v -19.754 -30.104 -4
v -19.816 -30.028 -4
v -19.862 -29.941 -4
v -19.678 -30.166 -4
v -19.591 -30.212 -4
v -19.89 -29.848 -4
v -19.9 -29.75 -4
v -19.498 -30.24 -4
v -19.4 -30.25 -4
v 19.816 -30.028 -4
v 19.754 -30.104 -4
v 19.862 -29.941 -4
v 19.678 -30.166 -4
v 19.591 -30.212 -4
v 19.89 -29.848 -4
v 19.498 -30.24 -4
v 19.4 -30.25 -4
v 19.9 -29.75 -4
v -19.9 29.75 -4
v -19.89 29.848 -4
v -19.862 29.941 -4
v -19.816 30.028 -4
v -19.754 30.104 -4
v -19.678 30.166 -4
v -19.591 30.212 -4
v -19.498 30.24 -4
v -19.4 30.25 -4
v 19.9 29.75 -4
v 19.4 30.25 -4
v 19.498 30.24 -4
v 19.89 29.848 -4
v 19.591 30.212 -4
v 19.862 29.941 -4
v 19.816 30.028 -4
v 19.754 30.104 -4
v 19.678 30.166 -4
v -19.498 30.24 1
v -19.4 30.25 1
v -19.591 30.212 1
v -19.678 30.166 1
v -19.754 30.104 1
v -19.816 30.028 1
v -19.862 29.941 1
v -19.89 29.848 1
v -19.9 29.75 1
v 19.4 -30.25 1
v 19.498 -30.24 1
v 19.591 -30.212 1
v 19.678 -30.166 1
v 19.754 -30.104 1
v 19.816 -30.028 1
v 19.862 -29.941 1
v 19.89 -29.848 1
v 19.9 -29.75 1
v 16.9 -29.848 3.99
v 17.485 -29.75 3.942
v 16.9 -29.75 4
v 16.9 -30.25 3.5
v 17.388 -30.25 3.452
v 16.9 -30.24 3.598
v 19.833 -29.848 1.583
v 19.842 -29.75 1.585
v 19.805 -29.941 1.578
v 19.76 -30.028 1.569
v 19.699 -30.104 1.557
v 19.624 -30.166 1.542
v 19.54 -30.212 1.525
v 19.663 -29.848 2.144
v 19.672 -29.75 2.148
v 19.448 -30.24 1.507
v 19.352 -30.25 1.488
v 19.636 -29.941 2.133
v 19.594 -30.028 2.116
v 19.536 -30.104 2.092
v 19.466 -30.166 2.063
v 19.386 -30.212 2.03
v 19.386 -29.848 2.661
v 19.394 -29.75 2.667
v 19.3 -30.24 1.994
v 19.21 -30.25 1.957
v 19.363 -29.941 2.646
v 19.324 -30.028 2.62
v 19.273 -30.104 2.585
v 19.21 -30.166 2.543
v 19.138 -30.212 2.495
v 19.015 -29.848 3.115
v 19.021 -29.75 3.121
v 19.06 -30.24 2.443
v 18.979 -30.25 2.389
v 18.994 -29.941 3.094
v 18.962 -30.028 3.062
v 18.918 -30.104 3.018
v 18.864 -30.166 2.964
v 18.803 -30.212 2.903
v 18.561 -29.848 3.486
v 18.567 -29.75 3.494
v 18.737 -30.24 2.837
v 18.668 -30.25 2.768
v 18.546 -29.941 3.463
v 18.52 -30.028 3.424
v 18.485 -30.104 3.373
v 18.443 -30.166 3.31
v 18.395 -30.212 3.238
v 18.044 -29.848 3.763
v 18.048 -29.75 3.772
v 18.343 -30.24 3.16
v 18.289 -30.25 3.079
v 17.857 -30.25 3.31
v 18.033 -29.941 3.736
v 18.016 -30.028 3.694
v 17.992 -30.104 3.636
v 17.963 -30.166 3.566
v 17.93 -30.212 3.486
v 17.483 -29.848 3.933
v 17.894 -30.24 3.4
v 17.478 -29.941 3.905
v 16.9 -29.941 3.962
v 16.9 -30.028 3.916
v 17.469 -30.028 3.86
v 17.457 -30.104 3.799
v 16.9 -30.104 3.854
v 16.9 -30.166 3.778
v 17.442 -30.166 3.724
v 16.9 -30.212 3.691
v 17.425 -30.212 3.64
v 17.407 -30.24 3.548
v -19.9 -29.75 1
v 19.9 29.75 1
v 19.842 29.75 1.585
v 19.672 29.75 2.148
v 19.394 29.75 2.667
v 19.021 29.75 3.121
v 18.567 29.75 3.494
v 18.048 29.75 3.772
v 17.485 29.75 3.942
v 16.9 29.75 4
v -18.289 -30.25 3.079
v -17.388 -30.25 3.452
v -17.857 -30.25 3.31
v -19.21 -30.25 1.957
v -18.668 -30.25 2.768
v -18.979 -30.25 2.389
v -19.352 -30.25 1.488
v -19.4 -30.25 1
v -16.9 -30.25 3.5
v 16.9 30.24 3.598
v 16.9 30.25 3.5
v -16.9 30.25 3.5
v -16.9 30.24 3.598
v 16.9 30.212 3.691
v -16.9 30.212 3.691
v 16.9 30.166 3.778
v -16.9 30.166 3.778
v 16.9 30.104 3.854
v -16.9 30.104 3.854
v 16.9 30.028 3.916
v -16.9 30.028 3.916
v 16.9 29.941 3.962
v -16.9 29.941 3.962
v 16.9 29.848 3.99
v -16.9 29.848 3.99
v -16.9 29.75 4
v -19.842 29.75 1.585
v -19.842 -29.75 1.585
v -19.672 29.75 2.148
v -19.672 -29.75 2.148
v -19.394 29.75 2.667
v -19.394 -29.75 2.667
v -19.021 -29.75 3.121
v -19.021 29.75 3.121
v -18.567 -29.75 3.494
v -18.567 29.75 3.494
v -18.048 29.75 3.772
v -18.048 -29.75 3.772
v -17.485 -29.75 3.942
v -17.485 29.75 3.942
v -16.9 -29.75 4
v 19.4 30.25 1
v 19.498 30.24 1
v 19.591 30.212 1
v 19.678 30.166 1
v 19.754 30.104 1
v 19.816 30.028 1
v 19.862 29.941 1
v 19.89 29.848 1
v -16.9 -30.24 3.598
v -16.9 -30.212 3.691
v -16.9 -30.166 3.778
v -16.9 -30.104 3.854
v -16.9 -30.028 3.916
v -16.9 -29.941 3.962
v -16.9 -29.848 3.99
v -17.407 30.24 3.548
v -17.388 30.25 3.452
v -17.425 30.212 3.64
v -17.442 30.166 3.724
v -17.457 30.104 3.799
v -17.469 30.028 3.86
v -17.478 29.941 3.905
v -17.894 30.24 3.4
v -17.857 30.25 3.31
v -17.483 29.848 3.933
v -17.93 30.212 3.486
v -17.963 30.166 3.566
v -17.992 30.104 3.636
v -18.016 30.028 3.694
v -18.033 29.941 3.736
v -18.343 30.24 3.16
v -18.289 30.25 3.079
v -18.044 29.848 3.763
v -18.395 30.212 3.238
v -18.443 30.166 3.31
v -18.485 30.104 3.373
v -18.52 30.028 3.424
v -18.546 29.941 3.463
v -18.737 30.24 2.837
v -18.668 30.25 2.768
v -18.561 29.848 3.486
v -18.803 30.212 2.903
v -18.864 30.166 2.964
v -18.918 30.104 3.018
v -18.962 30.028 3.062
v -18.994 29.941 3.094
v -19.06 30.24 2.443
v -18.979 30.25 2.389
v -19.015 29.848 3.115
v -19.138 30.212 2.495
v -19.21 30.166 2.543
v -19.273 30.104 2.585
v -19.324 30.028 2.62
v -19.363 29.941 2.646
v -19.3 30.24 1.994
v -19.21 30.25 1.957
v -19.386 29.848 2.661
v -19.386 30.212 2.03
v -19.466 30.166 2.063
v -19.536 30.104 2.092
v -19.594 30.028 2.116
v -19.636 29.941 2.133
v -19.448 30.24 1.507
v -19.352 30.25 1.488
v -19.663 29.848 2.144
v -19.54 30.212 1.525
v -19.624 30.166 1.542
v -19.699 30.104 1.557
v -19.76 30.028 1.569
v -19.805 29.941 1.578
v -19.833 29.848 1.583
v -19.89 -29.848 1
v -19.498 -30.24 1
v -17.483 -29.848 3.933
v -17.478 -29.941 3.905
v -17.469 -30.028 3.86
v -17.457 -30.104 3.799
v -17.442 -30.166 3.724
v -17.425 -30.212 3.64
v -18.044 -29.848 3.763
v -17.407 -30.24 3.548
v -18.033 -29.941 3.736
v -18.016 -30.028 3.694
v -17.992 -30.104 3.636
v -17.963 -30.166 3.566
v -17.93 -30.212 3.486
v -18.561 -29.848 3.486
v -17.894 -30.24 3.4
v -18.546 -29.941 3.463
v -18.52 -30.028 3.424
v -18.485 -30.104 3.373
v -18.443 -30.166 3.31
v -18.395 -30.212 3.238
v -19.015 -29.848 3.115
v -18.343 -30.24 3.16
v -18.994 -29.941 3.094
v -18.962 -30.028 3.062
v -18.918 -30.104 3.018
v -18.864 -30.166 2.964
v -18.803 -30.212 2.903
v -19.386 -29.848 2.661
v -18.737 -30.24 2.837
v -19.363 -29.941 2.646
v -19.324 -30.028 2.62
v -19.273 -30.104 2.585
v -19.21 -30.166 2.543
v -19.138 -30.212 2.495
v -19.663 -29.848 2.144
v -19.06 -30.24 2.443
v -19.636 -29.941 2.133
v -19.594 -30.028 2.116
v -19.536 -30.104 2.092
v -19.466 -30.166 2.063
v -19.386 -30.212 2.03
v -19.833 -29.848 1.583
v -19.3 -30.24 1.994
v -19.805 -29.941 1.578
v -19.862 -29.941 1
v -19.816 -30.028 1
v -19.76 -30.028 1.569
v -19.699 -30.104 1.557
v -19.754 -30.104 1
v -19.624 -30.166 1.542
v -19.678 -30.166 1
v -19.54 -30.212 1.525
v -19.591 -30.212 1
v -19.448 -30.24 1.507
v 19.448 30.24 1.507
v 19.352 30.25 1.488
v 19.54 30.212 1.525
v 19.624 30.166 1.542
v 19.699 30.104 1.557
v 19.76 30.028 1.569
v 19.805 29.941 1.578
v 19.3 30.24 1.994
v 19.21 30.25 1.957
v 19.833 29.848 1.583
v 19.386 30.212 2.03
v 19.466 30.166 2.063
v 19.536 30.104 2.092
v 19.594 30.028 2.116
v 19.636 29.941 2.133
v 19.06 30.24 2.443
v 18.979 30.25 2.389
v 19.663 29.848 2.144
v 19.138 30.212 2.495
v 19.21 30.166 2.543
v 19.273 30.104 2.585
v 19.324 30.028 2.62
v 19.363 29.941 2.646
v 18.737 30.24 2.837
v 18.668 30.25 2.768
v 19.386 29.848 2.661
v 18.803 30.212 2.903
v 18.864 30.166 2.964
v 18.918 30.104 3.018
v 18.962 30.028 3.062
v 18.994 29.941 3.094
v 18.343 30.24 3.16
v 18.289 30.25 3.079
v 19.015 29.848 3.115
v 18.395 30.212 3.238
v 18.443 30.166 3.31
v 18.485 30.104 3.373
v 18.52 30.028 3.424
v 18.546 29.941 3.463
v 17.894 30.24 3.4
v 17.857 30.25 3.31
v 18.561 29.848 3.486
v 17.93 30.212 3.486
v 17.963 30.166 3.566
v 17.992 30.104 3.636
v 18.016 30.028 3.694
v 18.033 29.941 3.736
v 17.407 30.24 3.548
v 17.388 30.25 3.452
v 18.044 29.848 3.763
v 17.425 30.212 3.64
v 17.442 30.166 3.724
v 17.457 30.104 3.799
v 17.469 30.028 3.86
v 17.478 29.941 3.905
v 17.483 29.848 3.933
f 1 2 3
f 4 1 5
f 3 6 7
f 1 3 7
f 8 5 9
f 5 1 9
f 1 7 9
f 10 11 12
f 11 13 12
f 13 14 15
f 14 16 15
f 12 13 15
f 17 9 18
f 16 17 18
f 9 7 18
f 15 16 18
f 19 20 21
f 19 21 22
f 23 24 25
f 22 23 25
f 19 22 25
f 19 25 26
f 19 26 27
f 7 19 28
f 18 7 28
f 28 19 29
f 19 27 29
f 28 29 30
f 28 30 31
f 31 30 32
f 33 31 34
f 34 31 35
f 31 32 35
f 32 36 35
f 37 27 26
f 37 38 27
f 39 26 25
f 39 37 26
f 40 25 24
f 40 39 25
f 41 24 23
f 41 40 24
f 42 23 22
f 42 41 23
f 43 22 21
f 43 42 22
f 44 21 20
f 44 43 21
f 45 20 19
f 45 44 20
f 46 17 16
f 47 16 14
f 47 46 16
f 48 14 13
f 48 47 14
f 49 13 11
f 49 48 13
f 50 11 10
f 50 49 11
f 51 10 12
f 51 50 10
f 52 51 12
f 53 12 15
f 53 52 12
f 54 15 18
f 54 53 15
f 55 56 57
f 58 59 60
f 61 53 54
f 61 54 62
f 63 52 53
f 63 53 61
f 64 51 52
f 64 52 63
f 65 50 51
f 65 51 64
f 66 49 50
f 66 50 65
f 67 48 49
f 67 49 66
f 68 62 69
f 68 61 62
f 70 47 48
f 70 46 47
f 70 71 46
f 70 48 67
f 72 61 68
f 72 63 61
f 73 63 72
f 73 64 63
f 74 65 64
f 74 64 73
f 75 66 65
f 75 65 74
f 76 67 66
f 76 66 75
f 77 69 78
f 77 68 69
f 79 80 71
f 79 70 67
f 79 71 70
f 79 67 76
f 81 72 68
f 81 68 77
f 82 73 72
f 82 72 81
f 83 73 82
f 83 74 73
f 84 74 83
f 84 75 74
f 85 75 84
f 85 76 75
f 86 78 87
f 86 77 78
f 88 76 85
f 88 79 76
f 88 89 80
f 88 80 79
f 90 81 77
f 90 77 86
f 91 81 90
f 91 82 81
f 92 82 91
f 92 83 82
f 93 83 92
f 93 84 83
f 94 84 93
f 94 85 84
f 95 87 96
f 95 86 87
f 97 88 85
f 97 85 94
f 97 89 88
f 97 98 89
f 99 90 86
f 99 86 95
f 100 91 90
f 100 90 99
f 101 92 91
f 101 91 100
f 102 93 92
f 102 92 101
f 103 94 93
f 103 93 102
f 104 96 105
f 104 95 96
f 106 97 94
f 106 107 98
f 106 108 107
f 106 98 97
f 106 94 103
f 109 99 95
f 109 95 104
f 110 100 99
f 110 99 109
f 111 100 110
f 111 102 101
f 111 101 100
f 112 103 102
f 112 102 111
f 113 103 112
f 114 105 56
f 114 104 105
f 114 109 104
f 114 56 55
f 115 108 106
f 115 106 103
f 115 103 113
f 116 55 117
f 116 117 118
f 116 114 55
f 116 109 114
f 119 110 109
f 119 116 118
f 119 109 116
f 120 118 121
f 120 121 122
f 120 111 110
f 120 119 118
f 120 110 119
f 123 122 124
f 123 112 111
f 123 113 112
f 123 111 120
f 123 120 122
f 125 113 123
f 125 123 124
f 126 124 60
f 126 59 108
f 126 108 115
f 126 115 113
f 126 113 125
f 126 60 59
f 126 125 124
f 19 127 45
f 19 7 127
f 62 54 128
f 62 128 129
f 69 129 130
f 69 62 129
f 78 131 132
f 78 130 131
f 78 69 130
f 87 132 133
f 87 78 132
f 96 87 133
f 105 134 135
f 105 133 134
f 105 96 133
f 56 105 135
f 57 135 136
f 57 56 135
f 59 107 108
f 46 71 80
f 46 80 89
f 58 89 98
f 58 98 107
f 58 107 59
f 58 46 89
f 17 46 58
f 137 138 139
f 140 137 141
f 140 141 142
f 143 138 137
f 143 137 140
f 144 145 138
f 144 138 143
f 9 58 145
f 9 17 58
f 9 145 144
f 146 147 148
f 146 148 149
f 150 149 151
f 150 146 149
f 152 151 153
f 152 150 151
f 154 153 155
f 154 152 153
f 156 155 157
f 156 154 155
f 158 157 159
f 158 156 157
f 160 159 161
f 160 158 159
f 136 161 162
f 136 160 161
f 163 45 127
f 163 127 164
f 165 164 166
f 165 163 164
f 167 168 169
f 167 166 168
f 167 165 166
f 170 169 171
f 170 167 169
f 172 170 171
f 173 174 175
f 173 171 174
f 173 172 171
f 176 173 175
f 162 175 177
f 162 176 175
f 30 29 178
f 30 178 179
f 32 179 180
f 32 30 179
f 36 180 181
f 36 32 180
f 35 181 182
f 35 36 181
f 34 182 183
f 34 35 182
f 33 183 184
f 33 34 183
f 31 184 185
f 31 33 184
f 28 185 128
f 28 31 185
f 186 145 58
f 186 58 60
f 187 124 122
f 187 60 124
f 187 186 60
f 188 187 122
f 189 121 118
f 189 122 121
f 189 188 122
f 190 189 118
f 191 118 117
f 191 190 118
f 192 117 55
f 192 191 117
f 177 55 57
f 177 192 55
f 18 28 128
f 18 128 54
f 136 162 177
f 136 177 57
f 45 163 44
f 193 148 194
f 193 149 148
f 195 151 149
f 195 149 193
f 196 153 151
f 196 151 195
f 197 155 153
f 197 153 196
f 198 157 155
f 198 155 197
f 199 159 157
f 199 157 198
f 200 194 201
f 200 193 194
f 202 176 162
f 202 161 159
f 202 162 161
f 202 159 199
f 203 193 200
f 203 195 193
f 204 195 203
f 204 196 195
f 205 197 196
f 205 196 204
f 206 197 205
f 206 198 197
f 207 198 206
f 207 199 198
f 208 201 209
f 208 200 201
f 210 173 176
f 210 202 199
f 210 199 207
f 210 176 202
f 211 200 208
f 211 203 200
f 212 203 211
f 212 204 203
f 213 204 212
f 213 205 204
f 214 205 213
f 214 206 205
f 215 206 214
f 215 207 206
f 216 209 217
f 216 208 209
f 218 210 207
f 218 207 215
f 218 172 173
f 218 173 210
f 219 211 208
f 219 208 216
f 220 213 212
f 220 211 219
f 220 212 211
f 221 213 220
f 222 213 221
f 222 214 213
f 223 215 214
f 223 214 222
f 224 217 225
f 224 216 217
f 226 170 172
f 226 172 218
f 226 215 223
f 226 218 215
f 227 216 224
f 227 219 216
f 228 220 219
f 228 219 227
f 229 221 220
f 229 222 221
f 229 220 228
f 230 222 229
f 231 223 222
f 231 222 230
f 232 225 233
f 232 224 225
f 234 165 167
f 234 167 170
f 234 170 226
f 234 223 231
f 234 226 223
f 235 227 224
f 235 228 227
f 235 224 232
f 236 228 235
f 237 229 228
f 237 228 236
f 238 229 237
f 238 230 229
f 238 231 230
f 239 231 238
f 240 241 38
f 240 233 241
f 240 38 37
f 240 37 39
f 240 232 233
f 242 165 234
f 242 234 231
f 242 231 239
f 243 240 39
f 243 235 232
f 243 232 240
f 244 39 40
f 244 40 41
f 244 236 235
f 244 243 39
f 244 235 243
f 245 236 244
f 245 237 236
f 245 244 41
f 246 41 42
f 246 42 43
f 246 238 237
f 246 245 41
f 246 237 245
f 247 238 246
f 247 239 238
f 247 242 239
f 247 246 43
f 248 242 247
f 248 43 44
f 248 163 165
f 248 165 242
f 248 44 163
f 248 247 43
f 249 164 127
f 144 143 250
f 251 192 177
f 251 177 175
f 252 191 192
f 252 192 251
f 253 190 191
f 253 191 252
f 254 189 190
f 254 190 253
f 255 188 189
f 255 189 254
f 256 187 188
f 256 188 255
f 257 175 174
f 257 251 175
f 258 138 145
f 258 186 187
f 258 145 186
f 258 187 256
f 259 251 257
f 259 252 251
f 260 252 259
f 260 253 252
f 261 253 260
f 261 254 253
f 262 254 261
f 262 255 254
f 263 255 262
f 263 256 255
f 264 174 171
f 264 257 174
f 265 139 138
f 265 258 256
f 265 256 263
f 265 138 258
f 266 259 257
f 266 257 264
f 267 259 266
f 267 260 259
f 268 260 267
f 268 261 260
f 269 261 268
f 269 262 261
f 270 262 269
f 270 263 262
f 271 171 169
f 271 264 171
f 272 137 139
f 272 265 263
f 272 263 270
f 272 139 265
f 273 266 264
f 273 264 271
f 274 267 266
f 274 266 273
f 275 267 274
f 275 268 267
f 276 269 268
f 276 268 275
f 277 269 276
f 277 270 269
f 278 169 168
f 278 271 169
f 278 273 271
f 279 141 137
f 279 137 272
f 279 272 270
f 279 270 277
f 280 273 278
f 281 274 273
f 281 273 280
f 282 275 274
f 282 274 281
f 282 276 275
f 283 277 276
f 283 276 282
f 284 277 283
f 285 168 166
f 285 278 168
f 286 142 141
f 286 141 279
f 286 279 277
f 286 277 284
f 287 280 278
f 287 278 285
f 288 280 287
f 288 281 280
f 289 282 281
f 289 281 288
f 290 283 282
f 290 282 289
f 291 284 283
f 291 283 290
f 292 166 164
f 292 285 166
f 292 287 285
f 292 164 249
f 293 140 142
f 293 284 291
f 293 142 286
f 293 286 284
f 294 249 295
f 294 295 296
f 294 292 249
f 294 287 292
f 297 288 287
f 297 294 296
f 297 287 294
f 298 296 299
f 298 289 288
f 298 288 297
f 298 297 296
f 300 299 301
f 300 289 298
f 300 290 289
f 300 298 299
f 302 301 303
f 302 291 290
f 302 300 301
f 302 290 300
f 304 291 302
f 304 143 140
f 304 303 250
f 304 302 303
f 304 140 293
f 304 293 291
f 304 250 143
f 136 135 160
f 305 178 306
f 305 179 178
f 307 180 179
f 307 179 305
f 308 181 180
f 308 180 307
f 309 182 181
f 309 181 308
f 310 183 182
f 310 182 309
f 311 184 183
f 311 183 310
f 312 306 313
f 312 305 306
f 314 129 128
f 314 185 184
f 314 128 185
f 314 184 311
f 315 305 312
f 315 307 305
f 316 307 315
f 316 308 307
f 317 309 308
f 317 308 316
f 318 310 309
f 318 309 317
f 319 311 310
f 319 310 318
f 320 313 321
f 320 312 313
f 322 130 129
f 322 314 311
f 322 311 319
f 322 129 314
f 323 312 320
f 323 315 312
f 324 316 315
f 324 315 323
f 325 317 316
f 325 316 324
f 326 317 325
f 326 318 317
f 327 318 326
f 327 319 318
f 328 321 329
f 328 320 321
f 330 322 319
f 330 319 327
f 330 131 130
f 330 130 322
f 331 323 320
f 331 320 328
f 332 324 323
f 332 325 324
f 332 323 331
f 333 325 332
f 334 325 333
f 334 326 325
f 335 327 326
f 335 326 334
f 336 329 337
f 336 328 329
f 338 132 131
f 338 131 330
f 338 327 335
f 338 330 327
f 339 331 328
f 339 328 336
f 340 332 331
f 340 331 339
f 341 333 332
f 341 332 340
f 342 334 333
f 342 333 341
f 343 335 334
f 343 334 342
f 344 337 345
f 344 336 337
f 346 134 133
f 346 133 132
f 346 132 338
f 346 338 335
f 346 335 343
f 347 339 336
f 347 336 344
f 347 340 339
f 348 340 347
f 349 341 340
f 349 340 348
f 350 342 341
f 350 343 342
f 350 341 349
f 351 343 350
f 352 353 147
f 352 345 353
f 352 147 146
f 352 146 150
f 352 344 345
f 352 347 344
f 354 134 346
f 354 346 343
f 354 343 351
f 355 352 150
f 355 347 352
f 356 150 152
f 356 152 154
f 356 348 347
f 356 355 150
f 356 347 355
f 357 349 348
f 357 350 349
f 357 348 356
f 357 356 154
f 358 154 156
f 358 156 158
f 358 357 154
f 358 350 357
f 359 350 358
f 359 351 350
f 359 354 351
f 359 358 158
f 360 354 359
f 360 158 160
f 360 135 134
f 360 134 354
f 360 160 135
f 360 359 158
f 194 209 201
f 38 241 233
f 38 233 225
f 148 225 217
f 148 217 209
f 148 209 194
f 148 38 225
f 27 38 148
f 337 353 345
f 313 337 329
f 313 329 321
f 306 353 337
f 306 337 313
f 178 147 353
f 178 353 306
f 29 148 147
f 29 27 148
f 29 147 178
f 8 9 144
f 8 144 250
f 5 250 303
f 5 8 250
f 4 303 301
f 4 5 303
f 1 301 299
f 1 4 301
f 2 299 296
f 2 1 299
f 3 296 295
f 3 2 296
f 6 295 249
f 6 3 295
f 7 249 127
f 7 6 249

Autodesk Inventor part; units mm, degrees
ref_plane "YZ Plane" through (0, 0, 0) normal (1, 0, 0) x (0, 1, 0)
ref_plane "XZ Plane" through (0, 0, 0) normal (0, 1, 0) x (-1, 0, 0)
ref_plane "XY Plane" through (0, 0, 0) normal (0, 0, 1) x (1, 0, 0)
sketch "Sketch1" plane through (0, 0, 0) normal (0, 0, 1) x (1, 0, 0)
  line L0 (-19.9, 30.25) -> (19.9, 30.25)
  line L1 (19.9, 30.25) -> (19.9, -30.25)
  line L2 (19.9, -30.25) -> (-19.9, -30.25)
  line L3 (-19.9, -30.25) -> (-19.9, 30.25)
  line L4 (-19.9, 30.25) -> (19.9, -30.25) construction
  line L5 (19.9, 30.25) -> (-19.9, -30.25) construction
  point P0 (0, 0)
  dimension "d0" = 39.8
  dimension "d1" = 60.5
extrude "Extrusion1" add sketch "Sketch1" along normal mid plane 8
fillet "Fillet1" radius 3 2 edges at (19.9, 0, 4) (-19.9, 0, 4)
fillet "Fillet2" radius 0.5 10 edges at (-19.0213, 30.25, 3.1213) (-19.9, 30.25, -1.5) (19.0213, 30.25, 3.1213) (19.9, 30.25, -1.5) (0, 30.25, 4) (19.0213, -30.25, 3.1213) (19.9, -30.25, -1.5) (-19.0213, -30.25, 3.1213) (-19.9, -30.25, -1.5) (0, -30.25, 4)
properties part number "Battery"
